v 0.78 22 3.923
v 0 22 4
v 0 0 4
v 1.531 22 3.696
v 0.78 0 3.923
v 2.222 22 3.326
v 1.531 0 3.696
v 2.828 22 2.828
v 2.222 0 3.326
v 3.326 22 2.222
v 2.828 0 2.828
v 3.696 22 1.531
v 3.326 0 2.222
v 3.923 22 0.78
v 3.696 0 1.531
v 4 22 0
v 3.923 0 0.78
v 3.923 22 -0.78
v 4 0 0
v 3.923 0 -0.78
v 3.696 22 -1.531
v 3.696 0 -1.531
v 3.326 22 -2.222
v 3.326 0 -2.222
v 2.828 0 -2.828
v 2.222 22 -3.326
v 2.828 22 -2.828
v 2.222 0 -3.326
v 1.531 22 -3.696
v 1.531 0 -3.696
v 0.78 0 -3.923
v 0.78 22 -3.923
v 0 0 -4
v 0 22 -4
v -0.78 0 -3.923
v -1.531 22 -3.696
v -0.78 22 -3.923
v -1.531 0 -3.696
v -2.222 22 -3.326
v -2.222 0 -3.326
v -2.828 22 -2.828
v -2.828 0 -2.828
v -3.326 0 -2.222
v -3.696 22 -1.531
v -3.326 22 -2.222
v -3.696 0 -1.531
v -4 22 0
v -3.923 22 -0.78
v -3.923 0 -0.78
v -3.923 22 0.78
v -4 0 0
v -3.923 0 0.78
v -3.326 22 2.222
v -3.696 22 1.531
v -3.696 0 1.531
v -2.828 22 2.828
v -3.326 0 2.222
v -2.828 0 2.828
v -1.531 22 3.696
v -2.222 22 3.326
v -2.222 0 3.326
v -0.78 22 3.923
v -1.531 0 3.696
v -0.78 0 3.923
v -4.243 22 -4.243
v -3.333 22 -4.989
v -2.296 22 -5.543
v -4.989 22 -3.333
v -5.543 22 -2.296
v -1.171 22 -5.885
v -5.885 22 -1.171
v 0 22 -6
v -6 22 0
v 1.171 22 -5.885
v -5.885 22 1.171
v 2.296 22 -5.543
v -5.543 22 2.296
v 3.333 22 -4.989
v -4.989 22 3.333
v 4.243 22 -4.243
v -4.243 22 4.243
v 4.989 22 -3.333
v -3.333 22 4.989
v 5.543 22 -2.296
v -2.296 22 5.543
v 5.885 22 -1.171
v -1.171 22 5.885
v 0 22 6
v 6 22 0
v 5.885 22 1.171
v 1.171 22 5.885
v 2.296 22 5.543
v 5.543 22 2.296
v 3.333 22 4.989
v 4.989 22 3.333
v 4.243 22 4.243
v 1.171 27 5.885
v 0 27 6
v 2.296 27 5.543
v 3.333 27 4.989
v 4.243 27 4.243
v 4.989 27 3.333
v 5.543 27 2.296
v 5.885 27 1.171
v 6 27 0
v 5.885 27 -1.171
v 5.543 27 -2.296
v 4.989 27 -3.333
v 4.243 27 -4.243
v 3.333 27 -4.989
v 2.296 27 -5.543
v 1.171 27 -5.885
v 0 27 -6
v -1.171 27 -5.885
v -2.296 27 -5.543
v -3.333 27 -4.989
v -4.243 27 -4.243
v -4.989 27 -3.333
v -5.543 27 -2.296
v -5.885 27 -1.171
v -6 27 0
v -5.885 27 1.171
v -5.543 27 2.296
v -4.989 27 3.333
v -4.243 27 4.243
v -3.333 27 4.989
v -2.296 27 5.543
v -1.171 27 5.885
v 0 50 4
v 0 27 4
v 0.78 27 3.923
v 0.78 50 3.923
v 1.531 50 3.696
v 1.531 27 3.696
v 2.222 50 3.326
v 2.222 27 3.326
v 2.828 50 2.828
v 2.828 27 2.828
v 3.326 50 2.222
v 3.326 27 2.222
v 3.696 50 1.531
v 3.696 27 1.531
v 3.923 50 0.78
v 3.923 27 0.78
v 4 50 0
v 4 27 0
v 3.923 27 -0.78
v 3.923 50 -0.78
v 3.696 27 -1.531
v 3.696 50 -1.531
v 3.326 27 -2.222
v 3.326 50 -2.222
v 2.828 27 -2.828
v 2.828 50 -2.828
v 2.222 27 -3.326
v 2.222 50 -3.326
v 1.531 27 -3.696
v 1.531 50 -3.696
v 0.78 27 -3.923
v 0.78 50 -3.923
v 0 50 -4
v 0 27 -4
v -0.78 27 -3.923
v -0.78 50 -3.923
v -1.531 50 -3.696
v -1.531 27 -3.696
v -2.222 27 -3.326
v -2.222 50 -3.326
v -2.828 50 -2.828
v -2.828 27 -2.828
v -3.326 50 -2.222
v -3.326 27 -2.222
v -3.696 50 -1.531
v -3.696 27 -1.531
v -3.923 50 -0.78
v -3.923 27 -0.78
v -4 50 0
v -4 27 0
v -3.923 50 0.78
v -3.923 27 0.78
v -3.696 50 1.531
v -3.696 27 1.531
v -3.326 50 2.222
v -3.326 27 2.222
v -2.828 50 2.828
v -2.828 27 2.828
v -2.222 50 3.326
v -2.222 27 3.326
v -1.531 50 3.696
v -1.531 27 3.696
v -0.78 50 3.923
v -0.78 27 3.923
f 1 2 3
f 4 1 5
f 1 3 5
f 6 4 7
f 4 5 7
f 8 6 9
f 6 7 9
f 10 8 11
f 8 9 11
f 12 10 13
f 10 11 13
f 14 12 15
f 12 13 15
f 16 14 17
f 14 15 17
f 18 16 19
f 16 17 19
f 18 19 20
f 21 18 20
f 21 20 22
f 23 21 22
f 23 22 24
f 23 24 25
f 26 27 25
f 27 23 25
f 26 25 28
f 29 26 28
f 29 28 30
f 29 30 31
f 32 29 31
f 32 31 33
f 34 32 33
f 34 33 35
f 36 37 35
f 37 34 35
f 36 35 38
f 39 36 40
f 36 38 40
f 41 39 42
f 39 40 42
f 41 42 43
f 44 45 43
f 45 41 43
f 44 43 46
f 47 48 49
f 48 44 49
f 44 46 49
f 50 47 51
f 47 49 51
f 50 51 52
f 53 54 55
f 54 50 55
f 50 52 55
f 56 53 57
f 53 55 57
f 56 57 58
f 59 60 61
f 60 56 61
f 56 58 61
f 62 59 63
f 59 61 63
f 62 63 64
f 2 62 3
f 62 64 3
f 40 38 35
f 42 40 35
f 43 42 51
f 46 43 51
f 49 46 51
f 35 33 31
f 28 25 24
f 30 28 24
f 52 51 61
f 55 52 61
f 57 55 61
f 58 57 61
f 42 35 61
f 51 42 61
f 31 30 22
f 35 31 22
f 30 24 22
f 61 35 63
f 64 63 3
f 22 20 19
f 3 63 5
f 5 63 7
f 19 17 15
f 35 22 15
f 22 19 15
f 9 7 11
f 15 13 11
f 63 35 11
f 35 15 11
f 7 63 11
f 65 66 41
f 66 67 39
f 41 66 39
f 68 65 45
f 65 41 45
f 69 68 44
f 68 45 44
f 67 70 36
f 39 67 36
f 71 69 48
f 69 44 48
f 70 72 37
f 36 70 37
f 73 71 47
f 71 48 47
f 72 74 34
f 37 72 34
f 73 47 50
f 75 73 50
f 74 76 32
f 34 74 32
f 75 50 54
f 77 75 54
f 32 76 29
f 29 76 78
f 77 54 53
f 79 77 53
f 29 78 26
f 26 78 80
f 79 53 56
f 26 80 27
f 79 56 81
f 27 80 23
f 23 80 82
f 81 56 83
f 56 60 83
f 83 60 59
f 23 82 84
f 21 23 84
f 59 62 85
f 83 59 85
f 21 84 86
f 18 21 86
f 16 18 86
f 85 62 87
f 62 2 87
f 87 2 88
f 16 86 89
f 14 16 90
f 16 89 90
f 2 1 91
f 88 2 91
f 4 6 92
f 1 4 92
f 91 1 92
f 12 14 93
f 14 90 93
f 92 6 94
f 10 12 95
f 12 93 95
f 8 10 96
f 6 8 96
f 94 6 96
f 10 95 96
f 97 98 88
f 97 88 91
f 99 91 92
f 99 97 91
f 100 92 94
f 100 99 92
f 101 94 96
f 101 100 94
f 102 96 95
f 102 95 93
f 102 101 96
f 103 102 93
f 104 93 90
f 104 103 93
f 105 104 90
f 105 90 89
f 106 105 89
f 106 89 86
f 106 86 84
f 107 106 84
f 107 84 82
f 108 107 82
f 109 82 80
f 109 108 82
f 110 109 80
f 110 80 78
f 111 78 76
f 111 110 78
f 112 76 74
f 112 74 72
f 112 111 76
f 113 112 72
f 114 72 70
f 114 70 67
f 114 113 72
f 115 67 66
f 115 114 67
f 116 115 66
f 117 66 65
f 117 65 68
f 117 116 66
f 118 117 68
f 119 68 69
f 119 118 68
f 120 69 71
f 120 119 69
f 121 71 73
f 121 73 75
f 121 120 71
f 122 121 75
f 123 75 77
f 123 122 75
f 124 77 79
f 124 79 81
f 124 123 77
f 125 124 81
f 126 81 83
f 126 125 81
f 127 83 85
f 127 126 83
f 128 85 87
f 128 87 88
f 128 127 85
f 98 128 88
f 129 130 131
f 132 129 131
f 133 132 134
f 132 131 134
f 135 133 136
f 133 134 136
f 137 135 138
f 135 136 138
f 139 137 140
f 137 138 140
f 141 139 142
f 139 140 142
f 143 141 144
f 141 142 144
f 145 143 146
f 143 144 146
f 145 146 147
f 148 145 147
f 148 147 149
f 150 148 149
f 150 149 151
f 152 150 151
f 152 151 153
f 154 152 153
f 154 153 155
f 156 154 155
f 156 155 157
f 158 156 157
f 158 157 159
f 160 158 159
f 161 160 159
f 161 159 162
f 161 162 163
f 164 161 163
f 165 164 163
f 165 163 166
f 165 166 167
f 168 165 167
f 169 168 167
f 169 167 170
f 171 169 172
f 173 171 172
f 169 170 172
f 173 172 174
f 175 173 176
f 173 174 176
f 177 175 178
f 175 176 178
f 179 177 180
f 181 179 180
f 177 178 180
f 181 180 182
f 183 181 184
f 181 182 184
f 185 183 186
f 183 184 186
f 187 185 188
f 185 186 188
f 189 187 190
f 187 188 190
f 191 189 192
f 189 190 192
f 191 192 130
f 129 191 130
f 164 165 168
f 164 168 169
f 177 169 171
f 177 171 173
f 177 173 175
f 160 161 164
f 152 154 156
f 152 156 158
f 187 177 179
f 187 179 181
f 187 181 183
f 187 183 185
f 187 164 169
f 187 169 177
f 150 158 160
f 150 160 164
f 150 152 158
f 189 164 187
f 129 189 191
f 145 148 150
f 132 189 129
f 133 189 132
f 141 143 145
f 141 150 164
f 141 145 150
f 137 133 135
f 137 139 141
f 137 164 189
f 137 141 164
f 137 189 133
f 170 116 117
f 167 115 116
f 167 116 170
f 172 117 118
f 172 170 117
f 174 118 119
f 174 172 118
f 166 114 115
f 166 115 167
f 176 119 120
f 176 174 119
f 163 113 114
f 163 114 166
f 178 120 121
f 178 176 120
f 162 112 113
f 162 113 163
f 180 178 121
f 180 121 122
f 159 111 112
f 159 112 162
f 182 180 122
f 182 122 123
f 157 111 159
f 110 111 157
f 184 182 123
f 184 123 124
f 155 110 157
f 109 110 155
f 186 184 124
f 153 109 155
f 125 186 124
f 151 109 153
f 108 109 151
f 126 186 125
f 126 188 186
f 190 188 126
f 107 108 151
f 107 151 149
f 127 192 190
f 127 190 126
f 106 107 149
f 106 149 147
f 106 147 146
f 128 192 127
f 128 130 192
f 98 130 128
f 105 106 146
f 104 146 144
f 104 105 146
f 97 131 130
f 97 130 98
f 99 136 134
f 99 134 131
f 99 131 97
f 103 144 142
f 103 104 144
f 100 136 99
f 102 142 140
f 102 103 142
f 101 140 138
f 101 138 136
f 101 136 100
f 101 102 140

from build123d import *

# Parameters (mm, degrees)
SKETCH1_R           = 4
BOSS_EXTRUDE1_DEPTH = 50
BOSS_EXTRUDE2_START = -23
SKETCH2_R           = 6
BOSS_EXTRUDE2_DEPTH = 5


with BuildPart() as part:
    # Sketch1 → Boss-Extrude1 (new body)
    with BuildSketch(Plane(origin=(0, 0, 0), x_dir=(1, 0, 0), z_dir=(0, 1, 0))):
        with Locations(Location((0, 0, 0), (0, 0, 270))):
            Circle(SKETCH1_R)
    extrude(amount=BOSS_EXTRUDE1_DEPTH)

    # Sketch2 → Boss-Extrude2 (add)
    with BuildSketch(Plane(origin=(0, 50, 0), x_dir=(1, 0, 0), z_dir=(0, 1, 0)).offset(BOSS_EXTRUDE2_START)):
        with Locations(Location((0, 0, 0), (0, 0, 270))):
            Circle(SKETCH2_R)
    extrude(amount=-BOSS_EXTRUDE2_DEPTH)


solid = part.part
